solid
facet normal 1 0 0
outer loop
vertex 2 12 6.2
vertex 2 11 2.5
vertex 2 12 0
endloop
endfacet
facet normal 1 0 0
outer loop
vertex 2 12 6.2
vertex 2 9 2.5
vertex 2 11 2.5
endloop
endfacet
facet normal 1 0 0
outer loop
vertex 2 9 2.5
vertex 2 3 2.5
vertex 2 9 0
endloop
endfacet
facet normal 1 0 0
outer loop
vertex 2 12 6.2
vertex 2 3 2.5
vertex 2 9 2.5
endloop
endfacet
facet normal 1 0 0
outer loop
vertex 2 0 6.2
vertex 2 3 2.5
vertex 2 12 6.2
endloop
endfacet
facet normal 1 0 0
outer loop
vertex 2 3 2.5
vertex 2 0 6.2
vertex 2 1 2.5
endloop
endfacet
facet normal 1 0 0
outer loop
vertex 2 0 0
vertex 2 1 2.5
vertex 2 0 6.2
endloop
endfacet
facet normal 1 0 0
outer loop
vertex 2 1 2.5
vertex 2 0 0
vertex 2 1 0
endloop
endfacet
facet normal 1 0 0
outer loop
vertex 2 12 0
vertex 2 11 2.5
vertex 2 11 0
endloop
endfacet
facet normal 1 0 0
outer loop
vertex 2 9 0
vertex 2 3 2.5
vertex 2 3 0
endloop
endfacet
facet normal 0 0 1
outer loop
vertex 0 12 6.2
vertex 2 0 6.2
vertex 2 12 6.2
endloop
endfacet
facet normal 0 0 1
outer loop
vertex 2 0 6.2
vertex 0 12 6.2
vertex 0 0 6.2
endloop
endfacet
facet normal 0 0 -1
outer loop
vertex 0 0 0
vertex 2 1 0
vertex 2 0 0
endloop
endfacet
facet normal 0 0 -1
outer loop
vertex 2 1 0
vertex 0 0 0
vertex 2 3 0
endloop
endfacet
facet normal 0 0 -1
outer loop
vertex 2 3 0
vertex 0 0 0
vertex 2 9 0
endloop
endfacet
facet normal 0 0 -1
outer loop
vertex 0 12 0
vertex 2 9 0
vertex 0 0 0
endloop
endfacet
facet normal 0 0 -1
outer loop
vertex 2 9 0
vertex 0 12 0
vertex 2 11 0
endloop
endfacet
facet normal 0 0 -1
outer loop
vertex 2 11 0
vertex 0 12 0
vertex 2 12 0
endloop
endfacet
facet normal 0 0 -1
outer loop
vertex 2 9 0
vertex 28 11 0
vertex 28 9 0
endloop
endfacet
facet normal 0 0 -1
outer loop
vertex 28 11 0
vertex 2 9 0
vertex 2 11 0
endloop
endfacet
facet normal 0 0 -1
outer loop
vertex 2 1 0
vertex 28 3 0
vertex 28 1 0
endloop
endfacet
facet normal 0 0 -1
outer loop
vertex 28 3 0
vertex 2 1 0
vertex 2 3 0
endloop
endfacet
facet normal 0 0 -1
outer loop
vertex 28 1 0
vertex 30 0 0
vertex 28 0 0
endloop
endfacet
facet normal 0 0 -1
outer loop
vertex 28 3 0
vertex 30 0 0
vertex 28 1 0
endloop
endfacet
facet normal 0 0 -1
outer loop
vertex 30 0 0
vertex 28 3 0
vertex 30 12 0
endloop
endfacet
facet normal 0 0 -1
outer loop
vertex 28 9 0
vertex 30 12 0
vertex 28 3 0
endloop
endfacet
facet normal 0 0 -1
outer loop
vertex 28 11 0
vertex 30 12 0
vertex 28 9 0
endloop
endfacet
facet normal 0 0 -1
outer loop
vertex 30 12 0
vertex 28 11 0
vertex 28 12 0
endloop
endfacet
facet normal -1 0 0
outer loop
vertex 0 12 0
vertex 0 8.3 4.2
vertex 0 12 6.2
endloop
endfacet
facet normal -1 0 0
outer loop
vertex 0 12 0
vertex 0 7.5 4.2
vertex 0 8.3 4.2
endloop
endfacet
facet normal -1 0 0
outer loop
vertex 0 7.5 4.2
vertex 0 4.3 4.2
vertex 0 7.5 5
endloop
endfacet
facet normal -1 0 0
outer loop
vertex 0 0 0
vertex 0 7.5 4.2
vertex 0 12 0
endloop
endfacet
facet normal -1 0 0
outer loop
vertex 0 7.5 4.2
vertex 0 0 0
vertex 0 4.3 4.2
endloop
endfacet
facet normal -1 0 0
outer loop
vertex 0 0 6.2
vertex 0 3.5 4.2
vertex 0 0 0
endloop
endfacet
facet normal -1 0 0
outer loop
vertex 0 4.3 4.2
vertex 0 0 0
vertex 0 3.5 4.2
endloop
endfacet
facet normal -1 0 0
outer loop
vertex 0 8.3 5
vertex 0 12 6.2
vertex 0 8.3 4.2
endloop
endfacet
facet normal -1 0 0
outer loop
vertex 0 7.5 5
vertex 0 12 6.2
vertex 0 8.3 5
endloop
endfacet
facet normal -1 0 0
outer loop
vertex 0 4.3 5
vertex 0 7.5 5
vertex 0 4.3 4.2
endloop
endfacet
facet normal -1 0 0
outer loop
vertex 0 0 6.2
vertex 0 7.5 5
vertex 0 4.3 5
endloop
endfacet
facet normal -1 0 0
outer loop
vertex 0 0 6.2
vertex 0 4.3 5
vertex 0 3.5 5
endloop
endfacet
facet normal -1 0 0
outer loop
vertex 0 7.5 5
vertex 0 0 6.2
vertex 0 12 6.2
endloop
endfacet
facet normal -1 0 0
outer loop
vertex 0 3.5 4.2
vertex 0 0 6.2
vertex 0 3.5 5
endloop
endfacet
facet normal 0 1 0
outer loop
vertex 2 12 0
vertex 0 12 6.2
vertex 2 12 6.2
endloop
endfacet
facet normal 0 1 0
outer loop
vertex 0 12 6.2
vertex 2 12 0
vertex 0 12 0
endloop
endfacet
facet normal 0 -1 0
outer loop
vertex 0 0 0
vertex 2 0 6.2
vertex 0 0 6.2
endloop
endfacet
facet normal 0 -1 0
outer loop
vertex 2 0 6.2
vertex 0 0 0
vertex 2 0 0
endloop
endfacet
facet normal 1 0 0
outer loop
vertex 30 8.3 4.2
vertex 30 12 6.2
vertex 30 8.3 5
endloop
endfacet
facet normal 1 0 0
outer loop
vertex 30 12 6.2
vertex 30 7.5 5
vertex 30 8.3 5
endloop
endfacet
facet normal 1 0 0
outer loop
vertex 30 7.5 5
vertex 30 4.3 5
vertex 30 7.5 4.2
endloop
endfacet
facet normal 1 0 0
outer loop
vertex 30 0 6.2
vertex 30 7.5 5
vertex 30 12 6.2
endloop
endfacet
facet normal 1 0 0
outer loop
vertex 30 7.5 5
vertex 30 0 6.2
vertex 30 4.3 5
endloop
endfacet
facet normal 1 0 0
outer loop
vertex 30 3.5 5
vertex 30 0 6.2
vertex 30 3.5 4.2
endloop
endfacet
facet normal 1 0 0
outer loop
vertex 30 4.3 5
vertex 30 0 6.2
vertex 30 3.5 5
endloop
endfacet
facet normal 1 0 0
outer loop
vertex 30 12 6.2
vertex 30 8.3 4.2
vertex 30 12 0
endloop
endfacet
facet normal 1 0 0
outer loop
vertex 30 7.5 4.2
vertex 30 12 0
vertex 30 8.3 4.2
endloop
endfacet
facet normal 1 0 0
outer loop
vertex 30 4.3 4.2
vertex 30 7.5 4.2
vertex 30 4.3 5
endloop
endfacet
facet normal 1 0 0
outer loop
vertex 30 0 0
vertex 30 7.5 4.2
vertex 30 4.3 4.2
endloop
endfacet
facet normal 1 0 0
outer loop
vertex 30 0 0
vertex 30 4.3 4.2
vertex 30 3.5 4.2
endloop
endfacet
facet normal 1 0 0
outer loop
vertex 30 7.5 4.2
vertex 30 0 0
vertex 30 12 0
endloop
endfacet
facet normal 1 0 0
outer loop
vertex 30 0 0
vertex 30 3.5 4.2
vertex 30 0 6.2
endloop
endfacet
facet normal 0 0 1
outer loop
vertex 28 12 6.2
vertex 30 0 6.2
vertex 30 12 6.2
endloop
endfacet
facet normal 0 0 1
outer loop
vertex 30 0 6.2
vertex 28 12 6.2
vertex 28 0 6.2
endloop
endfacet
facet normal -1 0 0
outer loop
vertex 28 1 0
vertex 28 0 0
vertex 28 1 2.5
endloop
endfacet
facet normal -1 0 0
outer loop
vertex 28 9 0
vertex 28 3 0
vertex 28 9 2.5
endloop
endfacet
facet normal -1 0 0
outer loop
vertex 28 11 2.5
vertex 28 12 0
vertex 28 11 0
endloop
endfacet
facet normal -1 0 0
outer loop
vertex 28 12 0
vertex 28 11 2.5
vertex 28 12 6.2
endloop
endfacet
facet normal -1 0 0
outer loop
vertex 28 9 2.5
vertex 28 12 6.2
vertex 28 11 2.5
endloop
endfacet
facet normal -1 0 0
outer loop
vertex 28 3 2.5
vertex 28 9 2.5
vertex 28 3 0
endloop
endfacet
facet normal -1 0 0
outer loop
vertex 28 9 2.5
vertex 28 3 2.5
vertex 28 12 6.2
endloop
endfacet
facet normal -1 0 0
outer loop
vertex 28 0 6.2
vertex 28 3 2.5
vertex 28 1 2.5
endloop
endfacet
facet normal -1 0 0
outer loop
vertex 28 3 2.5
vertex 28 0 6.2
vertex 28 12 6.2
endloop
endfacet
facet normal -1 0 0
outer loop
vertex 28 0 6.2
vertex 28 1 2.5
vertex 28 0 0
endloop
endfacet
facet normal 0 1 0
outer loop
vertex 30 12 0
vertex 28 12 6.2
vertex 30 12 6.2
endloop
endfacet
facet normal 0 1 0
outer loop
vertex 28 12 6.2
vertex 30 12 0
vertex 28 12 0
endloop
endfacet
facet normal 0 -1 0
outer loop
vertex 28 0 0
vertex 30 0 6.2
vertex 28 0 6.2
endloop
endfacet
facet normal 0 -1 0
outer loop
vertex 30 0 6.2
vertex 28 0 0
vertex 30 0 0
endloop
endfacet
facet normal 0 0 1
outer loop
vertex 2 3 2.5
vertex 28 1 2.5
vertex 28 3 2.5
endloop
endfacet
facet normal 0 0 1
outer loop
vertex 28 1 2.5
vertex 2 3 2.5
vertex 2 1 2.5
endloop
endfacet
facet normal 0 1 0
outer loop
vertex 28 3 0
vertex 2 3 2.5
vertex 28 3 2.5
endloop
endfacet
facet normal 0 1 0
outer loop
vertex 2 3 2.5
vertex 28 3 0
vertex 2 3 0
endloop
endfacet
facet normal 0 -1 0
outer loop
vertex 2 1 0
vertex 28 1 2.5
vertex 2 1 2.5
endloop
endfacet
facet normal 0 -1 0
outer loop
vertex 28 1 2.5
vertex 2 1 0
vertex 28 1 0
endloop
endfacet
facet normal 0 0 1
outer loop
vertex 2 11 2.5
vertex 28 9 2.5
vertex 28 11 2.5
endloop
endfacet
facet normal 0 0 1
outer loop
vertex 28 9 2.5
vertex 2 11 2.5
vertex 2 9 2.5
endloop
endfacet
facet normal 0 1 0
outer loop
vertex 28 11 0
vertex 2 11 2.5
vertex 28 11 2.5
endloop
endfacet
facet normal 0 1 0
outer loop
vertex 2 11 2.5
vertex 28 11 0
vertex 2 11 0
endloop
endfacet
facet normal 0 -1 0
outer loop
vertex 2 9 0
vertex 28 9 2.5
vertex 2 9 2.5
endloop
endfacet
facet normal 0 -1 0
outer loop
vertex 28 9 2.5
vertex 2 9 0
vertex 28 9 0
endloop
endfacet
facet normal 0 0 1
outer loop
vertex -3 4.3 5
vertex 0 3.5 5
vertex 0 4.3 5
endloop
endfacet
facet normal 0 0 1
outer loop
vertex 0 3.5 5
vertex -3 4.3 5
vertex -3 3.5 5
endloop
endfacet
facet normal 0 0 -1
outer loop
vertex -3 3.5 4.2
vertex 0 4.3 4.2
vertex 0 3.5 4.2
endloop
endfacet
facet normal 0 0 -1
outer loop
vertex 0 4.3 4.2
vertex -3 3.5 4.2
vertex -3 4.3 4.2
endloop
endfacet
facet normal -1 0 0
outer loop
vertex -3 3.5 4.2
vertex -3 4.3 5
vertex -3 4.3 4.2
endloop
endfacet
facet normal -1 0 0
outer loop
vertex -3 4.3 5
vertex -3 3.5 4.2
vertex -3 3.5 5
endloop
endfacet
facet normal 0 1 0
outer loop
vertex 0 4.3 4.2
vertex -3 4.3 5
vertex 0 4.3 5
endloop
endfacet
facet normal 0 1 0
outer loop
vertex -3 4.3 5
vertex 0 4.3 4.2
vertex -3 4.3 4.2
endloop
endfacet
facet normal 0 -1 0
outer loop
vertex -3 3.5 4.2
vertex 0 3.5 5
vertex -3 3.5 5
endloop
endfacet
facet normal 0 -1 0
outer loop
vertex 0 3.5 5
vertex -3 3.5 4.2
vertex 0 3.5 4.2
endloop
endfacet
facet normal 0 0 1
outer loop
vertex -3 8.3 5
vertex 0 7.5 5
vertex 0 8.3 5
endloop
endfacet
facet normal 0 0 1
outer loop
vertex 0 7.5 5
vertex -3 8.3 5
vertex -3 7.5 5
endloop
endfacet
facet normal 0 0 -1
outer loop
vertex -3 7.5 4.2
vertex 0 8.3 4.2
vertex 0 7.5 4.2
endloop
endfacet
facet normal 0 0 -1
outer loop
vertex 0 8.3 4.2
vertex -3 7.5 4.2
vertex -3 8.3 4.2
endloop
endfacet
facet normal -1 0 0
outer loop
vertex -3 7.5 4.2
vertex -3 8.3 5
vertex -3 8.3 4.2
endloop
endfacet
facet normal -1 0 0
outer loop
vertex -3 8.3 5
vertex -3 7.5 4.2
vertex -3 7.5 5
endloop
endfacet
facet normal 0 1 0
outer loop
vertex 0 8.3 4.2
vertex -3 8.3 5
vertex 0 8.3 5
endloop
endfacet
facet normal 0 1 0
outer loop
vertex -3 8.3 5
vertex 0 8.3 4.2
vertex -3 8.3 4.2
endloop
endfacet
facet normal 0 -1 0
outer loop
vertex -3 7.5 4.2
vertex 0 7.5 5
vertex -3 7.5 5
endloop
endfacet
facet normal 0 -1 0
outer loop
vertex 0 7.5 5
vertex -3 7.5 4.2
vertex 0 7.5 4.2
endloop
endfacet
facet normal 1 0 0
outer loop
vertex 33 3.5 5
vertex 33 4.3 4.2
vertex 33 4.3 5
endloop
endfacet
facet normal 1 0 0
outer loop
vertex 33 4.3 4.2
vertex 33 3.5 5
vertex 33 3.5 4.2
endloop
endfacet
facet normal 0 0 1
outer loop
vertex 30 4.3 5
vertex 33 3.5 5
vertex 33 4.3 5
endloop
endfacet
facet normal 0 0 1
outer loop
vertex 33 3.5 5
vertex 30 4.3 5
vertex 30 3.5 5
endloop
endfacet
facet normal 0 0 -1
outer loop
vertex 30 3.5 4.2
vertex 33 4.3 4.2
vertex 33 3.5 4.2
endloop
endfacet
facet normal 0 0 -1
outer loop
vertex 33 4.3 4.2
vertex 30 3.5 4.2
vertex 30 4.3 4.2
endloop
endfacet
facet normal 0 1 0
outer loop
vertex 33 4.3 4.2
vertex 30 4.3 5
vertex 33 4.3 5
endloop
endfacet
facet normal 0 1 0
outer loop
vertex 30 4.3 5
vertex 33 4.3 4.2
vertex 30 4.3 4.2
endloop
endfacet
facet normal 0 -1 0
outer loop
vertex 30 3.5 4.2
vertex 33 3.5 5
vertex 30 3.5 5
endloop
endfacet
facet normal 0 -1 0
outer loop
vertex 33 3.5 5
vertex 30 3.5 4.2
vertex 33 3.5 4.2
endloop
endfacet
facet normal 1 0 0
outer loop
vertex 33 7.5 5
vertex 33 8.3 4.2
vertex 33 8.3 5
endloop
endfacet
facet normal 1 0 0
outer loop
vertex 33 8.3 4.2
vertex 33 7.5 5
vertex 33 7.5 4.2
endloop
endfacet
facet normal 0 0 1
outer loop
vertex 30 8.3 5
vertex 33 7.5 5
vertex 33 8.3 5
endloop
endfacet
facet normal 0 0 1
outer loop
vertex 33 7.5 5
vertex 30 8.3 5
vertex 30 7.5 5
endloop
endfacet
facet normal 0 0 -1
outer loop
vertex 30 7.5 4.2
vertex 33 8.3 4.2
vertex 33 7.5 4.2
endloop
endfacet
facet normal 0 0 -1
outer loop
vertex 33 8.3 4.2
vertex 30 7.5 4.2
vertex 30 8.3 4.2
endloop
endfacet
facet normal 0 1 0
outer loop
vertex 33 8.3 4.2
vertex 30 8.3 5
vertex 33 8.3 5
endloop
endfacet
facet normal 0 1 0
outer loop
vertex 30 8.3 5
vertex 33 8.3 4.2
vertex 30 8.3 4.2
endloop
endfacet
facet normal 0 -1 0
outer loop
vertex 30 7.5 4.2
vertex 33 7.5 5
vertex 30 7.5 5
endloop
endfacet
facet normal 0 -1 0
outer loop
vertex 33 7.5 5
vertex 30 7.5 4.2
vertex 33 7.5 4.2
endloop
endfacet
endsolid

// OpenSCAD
/*
  block A - (6.2, 12, 2)
  block B - (2.5, 2, 30)
  block C - (0.8, 0.8, 3)
  (height, width, lenght)
  all in centimeters
*/

ah = 6.2;
aw = 12;
al = 2;
blockA = [al,aw,ah];

bh = 2.5;
bw = 2;
bl = 30;
blockB = [bl,bw,bh];

ch = 0.8;
cw = 0.8;
cl = 3;
blockC = [cl,cw,ch];

blockA2t = [(bl-al), 0, 0];

offset = 1;
blockB1t = [0,offset,0];
blockB2t = [0,(aw-offset-bw),0];

blockC1t = [-cl,3.5,(ah-2)];
blockC2t = [-cl,7.5,(ah-2)];
blockC3t = [bl,3.5,(ah-2)];
blockC4t = [bl,7.5,(ah-2)];

blockBcolor = [0.5, 0.5, 0.5];
blockCcolor = [0, 0, 1];

cube(blockA);

translate(blockA2t) {
  cube(blockA);
}

translate(blockB1t) {
  color(blockBcolor)
  cube(blockB);
}

translate(blockB2t) {
  color(blockBcolor)
  cube(blockB);
}

translate(blockC1t) {
  color(blockCcolor)
  cube(blockC);
}

translate(blockC2t) {
  color(blockCcolor)
  cube(blockC);
}

translate(blockC3t) {
  color(blockCcolor)
  cube(blockC);
}

translate(blockC4t) {
  color(blockCcolor)
  cube(blockC);
}

// END
